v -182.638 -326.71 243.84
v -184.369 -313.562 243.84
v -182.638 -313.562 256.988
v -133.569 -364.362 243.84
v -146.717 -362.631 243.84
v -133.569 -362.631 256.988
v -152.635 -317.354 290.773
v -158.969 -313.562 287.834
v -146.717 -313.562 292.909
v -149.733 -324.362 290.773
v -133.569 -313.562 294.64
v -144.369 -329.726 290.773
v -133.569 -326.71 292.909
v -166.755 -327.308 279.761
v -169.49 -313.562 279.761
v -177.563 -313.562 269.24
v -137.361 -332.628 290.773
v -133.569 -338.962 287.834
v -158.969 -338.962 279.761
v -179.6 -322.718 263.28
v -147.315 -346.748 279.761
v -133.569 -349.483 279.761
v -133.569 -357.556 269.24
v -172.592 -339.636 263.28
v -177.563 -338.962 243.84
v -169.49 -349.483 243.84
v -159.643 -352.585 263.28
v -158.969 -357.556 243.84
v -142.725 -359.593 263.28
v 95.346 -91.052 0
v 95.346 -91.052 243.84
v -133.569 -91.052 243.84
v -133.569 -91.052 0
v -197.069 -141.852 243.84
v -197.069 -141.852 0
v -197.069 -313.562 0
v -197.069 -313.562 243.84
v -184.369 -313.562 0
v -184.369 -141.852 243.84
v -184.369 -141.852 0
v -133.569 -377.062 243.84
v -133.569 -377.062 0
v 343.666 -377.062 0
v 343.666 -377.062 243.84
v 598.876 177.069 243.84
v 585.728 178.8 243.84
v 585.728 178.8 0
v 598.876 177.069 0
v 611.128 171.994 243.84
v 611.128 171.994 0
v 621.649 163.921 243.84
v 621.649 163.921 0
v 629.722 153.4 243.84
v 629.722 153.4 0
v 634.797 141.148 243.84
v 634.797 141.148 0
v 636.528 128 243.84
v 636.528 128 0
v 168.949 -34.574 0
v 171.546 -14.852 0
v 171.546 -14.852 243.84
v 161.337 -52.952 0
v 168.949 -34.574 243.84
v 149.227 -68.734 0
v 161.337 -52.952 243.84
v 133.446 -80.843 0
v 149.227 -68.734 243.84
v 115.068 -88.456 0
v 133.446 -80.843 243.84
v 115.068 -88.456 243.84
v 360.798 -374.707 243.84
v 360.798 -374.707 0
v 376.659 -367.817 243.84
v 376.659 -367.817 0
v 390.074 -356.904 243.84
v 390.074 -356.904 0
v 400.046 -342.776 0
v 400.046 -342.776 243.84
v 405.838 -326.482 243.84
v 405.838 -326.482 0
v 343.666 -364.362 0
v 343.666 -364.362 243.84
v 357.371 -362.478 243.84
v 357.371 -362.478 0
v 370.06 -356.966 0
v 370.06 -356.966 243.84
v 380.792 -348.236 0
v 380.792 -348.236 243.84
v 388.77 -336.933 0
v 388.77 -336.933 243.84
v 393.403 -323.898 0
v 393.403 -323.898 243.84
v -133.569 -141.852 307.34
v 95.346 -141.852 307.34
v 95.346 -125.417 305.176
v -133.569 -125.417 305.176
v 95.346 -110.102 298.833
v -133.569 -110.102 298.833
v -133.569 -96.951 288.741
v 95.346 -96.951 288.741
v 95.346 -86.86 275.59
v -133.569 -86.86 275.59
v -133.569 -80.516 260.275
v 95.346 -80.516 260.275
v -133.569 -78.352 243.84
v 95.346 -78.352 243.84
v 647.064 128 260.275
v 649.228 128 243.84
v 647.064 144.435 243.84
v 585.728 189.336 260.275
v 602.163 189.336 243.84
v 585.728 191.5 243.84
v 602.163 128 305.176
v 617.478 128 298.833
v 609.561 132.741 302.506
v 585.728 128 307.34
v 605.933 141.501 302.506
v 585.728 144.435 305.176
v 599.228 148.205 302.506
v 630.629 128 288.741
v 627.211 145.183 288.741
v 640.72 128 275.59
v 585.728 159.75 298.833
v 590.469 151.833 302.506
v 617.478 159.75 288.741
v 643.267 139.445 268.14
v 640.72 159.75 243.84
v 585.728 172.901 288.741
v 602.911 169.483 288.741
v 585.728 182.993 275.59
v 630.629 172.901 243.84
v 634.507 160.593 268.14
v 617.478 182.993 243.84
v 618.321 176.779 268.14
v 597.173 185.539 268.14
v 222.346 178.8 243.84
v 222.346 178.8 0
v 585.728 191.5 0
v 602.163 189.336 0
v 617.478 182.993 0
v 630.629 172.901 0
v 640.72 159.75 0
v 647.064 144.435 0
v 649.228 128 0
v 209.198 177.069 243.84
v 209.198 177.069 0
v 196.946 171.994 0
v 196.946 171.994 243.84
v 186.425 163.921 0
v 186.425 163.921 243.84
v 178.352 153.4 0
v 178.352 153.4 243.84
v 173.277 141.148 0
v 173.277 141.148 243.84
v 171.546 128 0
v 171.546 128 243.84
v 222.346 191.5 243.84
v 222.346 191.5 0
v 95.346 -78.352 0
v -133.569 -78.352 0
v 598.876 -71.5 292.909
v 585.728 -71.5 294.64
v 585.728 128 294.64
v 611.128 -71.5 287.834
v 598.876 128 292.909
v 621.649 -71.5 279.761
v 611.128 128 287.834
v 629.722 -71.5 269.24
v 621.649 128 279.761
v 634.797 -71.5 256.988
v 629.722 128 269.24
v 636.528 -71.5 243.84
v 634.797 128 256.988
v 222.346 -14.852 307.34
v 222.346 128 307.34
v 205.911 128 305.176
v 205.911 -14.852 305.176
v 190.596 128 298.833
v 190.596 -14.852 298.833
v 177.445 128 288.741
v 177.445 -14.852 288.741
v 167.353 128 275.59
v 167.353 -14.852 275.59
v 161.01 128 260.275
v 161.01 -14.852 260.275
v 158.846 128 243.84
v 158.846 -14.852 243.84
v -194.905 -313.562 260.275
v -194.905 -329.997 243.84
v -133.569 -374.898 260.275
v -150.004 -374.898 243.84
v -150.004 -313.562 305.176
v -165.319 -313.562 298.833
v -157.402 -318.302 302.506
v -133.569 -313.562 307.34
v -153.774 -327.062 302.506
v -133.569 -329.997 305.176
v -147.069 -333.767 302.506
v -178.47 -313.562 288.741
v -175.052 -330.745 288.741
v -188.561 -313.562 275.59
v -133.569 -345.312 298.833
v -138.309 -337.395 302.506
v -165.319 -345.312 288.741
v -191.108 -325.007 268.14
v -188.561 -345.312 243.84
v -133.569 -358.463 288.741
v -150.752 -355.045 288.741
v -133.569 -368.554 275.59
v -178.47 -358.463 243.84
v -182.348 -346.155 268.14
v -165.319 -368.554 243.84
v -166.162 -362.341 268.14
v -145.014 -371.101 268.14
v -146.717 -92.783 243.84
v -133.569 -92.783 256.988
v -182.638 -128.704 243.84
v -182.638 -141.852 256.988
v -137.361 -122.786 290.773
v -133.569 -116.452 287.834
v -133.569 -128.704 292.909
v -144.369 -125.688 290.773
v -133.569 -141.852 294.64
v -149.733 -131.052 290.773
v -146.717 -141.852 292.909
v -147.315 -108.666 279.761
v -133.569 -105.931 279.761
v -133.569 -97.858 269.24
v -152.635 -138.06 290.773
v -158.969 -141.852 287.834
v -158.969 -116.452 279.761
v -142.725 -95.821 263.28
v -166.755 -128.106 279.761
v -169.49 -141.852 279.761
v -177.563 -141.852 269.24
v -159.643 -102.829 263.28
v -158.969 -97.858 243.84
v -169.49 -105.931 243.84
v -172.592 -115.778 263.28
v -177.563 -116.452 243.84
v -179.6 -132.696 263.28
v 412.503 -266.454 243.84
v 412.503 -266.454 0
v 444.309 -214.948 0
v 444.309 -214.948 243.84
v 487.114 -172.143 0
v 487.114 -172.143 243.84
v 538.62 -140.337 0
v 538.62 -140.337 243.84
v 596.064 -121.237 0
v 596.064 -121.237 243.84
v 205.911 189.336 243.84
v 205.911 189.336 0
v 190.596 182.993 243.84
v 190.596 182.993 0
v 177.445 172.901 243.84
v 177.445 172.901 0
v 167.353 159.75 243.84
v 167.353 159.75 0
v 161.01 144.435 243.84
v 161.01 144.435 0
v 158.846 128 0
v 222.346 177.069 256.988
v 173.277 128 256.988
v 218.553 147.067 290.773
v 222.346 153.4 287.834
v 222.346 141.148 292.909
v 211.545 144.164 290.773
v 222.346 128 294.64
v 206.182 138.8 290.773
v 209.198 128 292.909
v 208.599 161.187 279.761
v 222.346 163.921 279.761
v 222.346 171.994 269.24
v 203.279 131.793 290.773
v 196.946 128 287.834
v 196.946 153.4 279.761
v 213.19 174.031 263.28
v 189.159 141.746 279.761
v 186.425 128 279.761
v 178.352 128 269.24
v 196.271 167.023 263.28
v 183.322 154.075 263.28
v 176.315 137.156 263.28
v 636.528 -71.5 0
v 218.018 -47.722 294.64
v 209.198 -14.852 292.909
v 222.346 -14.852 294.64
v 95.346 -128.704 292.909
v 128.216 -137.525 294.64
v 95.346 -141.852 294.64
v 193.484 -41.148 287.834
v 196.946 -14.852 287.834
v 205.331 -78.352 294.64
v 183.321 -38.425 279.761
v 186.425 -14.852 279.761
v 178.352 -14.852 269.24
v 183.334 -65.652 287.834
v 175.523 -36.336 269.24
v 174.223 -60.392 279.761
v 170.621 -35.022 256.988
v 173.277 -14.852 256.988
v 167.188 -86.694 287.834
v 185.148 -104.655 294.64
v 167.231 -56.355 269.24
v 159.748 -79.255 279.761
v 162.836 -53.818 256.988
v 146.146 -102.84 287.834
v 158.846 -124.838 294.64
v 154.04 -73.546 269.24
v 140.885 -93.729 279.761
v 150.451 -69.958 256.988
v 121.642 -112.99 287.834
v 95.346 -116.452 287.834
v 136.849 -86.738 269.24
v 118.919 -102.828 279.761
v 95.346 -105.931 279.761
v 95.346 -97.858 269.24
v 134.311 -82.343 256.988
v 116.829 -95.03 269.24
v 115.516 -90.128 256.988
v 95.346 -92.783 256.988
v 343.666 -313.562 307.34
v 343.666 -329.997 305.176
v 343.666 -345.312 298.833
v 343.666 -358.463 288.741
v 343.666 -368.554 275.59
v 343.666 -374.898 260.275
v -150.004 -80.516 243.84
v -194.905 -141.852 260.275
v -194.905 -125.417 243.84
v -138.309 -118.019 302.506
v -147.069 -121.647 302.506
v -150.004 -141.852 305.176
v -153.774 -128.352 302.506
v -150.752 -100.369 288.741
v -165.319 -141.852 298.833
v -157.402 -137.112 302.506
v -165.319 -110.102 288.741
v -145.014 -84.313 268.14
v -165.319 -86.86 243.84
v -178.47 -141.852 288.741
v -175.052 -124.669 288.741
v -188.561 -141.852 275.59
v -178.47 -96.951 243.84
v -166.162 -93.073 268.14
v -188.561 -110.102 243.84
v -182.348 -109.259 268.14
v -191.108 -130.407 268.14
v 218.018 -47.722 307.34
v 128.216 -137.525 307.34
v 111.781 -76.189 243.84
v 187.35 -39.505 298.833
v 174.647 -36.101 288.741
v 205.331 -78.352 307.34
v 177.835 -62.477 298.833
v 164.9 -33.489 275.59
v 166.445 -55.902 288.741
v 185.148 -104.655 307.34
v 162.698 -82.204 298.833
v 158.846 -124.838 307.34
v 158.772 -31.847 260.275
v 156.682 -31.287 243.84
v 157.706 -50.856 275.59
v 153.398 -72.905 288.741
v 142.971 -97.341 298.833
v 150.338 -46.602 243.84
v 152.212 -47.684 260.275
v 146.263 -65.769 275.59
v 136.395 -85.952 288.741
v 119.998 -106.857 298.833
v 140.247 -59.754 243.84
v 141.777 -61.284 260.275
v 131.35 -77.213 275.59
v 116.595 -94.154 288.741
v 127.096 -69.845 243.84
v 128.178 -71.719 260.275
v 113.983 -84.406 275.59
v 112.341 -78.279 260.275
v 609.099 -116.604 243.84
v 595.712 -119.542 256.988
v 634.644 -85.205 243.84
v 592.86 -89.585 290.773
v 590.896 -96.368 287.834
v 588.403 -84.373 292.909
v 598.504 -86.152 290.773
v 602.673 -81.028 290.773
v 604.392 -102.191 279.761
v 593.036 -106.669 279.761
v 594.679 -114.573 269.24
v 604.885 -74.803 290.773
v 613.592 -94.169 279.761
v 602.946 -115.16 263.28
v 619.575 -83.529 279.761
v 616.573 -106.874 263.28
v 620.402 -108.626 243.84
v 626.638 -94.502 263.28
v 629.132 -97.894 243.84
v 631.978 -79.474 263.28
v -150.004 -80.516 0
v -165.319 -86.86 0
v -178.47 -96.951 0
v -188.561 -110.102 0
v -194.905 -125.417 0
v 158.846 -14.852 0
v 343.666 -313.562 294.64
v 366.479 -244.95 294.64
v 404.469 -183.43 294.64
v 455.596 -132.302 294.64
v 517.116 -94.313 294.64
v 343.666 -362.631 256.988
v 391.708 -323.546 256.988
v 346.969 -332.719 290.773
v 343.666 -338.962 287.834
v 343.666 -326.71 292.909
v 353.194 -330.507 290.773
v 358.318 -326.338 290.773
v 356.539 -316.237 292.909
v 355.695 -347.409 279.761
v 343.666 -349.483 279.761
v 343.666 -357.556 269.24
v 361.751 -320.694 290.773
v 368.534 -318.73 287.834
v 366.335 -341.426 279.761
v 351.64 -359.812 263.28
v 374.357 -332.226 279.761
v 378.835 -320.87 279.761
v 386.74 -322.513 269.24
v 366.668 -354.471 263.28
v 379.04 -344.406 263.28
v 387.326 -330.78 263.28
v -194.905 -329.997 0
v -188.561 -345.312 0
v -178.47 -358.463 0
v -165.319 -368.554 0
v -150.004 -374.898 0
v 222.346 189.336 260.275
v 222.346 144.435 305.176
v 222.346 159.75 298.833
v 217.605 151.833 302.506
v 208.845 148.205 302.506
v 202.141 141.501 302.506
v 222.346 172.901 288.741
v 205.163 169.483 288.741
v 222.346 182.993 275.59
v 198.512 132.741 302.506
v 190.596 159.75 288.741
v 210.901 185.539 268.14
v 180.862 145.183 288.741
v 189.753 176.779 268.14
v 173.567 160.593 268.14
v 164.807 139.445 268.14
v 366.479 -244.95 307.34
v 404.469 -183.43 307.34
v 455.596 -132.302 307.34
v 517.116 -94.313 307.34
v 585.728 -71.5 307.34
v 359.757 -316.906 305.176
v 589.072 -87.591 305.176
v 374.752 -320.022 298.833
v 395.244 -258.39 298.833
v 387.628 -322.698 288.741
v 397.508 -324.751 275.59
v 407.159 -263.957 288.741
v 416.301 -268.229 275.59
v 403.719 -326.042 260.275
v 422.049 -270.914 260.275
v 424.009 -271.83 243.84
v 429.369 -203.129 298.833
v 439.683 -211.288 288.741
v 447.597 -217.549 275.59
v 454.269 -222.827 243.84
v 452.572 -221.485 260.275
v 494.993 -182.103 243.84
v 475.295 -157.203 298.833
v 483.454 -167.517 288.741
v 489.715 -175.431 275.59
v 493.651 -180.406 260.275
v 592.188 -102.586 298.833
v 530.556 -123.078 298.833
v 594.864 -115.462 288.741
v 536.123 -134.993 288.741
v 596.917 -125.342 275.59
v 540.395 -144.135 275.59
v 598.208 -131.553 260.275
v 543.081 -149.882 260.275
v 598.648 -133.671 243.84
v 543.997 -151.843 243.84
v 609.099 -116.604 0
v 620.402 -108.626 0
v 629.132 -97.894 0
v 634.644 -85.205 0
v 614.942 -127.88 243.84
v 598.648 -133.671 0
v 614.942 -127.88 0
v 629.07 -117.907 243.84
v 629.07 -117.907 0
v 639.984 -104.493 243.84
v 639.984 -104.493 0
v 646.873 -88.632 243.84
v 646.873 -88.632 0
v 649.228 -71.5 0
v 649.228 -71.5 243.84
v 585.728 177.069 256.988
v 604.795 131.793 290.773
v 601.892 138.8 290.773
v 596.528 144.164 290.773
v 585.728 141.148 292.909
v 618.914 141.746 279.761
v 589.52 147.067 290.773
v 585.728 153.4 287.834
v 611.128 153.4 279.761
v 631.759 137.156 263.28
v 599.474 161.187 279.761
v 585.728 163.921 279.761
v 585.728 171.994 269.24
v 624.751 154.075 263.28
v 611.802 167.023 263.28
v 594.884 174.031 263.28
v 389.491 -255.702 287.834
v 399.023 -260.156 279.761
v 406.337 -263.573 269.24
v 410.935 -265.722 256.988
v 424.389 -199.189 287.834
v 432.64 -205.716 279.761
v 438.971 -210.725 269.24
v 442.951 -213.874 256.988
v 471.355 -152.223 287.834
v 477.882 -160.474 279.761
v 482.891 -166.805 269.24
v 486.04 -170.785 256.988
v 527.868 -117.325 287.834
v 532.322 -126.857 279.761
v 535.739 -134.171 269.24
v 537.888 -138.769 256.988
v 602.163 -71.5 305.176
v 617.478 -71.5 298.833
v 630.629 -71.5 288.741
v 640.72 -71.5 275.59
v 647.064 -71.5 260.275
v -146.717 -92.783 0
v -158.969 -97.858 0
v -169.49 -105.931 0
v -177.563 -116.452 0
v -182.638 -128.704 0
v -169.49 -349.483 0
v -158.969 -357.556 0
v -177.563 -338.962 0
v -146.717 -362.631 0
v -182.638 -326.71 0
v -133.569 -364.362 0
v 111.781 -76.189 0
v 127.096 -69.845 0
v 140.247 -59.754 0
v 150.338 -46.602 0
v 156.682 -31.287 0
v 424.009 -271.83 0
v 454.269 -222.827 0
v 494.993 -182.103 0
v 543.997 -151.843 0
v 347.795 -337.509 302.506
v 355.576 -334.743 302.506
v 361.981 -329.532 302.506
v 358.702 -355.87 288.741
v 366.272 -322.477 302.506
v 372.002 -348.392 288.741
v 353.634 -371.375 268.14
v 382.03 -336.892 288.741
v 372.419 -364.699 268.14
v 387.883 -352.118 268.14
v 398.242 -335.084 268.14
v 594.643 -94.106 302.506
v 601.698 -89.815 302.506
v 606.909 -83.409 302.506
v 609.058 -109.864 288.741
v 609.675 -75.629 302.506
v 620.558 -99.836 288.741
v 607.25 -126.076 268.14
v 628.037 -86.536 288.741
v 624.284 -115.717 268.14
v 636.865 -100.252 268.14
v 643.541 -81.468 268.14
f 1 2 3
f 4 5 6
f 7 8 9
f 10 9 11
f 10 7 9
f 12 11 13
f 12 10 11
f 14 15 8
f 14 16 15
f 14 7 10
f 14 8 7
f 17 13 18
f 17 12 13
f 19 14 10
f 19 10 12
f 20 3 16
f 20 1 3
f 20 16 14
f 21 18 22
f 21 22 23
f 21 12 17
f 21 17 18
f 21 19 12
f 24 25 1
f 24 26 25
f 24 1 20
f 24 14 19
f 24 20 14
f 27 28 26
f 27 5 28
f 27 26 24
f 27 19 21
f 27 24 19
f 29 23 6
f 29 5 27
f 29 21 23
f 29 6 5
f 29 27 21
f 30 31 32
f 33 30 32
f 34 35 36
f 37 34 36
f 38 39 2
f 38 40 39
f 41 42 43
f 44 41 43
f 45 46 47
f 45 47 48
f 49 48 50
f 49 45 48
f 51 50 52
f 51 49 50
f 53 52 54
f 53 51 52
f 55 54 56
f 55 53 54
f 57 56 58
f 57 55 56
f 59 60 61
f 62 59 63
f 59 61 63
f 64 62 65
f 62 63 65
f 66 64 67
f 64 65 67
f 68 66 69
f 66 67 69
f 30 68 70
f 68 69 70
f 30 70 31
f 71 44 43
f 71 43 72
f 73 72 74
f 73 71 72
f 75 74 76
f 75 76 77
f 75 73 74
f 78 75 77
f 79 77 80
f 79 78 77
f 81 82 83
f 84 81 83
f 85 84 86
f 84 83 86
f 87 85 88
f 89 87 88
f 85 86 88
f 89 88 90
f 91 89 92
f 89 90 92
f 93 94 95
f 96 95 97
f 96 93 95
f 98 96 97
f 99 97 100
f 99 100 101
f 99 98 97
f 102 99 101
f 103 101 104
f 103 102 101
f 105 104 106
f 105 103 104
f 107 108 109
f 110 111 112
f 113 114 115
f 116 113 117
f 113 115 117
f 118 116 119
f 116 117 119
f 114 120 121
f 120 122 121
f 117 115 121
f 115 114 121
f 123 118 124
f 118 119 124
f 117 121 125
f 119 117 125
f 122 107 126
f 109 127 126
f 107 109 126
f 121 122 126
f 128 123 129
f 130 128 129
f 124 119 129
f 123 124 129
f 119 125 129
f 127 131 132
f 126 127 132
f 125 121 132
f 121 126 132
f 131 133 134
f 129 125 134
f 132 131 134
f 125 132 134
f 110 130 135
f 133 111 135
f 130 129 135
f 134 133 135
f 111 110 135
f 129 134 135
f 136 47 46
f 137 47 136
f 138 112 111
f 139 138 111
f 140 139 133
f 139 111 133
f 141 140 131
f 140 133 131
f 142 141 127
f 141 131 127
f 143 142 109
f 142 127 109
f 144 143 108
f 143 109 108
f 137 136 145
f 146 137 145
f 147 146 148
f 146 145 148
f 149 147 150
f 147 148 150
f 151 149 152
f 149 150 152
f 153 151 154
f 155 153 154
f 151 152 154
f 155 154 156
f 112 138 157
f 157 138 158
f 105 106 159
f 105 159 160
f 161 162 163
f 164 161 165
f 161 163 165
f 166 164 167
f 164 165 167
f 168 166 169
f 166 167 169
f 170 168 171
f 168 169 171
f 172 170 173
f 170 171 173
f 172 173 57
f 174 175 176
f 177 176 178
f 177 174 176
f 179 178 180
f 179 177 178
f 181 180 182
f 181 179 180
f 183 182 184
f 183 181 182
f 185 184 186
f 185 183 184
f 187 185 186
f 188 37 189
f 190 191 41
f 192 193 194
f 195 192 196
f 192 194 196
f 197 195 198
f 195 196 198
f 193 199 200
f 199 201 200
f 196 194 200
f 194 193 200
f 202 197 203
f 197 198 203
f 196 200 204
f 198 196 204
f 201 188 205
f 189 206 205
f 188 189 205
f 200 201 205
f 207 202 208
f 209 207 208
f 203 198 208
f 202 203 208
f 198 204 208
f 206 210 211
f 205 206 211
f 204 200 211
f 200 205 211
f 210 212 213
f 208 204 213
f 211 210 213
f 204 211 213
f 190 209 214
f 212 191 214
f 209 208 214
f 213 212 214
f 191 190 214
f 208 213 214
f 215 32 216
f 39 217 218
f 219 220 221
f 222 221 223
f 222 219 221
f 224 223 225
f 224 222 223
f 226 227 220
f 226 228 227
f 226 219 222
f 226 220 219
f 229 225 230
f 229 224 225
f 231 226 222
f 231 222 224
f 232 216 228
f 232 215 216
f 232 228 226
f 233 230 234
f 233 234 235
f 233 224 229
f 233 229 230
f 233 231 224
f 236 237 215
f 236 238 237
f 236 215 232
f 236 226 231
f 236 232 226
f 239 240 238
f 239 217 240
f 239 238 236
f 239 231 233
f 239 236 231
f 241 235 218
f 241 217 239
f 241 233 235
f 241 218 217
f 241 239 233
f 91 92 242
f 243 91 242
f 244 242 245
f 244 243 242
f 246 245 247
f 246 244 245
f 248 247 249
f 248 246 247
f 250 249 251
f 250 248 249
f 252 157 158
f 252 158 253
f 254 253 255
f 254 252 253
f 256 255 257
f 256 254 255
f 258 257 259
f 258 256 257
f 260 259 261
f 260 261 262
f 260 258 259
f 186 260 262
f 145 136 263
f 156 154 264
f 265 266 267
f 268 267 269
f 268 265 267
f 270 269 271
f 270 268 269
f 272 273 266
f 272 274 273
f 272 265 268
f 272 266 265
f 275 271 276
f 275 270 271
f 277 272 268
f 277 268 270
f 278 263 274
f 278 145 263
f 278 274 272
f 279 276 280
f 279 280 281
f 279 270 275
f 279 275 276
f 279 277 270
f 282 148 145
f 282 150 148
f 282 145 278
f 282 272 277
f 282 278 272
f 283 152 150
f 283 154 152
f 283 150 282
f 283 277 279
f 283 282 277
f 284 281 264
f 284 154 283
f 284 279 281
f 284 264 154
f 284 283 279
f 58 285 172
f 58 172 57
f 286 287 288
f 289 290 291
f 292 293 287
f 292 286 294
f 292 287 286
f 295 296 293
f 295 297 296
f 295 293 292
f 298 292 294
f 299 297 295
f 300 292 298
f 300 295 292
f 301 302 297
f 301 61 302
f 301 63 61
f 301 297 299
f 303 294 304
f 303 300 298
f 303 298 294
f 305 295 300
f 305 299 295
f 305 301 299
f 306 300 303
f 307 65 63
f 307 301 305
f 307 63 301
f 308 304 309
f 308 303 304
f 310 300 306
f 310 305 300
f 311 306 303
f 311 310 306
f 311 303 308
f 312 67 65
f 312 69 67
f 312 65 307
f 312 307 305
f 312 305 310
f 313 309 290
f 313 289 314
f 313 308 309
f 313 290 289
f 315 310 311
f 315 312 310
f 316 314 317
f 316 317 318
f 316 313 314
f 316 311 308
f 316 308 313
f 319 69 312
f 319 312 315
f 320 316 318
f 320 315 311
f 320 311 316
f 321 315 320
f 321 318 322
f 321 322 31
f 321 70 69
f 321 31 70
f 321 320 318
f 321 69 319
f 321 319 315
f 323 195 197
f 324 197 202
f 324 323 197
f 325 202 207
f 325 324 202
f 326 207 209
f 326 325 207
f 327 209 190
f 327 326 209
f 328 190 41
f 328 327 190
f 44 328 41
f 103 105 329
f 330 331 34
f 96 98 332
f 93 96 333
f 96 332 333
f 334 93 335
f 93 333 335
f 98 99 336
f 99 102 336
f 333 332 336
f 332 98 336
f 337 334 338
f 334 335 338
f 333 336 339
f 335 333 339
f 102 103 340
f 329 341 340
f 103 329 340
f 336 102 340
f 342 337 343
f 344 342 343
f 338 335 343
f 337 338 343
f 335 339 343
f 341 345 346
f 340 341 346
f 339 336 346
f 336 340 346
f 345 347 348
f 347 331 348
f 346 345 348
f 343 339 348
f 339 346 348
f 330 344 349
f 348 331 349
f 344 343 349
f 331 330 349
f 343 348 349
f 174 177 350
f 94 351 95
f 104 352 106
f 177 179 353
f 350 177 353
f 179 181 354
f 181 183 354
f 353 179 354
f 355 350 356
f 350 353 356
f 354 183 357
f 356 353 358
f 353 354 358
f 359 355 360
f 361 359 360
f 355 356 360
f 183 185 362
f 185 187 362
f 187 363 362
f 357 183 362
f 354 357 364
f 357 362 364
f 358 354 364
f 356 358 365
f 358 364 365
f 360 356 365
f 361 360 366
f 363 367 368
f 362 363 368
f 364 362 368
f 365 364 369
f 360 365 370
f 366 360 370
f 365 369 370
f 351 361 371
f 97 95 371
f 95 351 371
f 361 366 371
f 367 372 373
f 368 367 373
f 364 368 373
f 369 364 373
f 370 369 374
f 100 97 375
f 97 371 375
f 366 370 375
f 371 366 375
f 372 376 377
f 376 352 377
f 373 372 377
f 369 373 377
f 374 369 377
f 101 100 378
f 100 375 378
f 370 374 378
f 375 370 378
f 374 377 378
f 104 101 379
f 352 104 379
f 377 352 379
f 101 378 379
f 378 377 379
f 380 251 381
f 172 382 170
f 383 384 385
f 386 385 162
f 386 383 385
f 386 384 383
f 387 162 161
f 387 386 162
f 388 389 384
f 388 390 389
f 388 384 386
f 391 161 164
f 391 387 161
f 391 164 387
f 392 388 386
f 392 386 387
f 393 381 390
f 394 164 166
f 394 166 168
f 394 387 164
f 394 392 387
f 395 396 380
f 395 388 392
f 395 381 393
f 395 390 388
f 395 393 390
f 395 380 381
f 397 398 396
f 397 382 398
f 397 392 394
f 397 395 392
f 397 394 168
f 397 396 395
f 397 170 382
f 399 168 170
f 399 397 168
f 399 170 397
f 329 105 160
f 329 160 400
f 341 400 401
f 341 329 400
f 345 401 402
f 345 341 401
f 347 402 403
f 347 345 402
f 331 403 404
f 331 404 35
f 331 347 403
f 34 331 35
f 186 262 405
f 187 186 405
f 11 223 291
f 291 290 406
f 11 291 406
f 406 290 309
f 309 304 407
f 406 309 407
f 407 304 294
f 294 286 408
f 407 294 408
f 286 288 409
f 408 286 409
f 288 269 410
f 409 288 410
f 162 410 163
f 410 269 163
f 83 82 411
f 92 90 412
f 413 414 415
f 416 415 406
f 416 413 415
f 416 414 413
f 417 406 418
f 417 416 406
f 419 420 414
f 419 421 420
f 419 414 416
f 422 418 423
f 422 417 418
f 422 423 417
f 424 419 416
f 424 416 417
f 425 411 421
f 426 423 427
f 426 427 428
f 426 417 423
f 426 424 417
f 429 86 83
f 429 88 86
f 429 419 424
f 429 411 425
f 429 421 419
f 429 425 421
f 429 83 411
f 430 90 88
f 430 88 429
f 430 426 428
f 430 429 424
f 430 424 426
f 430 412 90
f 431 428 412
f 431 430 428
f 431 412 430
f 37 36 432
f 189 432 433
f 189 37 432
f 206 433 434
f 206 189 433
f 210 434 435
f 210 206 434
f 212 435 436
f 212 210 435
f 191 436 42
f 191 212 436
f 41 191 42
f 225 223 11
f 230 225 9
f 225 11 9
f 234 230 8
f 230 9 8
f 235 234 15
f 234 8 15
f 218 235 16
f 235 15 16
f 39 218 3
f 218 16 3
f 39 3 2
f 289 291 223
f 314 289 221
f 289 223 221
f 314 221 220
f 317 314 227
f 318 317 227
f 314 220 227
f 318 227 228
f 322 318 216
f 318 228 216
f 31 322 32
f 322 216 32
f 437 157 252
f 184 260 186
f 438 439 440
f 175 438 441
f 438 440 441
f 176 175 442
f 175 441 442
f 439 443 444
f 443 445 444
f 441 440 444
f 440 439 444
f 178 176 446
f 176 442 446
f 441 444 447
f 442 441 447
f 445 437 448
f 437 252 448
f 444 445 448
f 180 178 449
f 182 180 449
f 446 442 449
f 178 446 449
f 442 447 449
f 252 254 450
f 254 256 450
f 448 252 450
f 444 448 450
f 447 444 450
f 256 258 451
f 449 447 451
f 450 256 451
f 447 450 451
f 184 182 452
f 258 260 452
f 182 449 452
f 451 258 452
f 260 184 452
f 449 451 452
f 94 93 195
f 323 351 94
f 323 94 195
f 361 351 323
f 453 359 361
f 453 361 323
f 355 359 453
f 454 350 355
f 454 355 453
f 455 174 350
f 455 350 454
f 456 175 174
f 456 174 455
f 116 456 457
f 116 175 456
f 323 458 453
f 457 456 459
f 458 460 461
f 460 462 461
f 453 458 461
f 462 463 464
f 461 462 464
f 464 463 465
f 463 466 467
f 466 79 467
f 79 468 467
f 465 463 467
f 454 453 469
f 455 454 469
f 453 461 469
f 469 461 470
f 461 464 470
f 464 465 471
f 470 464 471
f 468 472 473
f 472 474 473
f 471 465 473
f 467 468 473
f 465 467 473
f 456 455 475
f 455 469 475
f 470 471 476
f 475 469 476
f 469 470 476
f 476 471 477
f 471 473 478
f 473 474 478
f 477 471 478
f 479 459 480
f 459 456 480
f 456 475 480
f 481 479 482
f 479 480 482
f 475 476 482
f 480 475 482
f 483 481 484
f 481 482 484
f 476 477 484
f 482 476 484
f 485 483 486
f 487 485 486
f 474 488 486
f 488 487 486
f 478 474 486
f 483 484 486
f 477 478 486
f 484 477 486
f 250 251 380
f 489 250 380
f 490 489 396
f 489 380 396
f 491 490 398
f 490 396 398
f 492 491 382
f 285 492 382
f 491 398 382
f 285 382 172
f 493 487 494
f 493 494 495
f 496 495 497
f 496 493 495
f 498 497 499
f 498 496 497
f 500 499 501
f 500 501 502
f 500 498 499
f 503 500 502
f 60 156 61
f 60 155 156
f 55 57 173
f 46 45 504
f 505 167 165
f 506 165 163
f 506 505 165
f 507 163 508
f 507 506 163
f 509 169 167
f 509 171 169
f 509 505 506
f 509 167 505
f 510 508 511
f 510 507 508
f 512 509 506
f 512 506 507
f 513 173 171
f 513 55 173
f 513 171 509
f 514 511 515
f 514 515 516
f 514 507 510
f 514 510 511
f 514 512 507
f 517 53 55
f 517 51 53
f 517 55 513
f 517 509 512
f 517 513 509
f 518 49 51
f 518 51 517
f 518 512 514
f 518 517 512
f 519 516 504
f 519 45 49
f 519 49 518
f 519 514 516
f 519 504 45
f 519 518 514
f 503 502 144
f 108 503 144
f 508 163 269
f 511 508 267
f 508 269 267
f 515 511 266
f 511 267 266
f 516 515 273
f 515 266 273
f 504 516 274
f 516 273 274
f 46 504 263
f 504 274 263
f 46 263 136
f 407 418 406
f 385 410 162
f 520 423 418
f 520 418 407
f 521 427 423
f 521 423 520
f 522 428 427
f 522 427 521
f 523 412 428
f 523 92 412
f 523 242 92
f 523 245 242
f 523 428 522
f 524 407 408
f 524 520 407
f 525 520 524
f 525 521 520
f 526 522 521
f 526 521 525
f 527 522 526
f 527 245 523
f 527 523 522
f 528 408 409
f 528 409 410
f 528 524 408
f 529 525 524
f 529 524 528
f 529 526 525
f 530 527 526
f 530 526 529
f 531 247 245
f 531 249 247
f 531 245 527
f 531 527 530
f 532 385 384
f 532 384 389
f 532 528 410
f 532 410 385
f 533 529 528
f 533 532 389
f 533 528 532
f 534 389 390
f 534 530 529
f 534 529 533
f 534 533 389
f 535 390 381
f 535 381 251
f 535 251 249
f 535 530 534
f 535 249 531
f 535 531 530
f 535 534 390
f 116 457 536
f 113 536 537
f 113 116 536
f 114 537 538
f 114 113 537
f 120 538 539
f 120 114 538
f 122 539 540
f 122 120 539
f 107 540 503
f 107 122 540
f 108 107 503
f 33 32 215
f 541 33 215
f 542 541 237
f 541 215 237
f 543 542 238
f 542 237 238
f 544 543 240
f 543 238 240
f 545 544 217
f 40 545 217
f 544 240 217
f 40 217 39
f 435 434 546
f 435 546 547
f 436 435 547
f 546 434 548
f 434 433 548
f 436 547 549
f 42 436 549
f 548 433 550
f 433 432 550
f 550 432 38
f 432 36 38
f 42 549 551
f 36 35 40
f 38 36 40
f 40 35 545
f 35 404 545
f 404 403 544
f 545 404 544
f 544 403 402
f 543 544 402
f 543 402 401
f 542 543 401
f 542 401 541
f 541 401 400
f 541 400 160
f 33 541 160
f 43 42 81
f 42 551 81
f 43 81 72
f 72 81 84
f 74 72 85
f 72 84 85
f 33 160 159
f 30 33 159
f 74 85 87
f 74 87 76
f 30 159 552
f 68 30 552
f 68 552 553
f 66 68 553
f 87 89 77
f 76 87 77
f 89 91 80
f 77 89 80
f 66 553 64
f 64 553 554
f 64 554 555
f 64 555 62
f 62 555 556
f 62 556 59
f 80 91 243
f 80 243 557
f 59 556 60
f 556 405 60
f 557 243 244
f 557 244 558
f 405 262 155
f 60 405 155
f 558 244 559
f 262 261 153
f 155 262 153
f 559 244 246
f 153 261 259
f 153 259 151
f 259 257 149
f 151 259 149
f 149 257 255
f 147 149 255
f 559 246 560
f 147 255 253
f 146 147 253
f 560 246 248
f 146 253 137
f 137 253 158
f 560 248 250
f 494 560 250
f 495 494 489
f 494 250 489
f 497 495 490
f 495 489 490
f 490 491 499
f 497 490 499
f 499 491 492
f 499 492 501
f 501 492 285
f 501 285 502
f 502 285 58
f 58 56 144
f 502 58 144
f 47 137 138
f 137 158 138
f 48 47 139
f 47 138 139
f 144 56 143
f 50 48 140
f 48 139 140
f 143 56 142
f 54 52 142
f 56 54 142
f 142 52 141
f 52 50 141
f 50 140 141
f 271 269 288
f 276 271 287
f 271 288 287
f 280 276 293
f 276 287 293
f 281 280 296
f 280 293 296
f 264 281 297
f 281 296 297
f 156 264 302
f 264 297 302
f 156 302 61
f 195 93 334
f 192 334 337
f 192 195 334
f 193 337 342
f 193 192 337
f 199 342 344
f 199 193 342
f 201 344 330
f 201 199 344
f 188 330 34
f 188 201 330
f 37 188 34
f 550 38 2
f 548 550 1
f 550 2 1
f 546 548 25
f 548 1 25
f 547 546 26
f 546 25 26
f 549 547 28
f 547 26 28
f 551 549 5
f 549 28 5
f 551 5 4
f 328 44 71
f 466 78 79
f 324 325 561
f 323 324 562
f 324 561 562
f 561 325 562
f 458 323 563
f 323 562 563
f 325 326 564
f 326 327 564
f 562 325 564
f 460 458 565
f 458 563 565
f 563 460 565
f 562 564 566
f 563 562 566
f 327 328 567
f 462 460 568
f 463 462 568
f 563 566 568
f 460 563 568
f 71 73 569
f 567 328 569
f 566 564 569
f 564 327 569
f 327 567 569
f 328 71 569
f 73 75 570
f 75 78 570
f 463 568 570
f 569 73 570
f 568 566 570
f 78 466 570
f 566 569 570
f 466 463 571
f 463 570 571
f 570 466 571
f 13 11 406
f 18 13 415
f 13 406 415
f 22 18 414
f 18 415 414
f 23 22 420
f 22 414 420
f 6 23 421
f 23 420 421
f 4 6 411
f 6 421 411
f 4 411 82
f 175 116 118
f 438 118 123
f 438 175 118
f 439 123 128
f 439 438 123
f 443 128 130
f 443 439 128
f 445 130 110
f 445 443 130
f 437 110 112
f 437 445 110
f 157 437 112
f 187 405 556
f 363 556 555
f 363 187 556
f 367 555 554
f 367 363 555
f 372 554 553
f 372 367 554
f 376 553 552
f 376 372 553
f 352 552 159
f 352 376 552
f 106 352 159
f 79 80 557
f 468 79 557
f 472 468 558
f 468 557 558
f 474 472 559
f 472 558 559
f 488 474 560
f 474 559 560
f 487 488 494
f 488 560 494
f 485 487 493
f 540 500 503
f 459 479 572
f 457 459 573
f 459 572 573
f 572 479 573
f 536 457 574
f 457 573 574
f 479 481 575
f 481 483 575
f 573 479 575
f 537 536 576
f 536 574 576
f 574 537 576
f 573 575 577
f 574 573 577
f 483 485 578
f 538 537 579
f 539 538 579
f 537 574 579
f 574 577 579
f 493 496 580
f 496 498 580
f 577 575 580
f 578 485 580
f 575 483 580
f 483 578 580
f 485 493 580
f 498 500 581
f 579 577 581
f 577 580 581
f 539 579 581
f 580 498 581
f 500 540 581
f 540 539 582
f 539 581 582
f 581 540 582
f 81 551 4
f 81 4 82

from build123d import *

# Parameters (mm, degrees)
F1_DEPTH = 307.34
F2_R     = 63.5
F3_R     = 63.5
F4_T     = -12.7


with BuildPart() as f1:
    # F0 (on Top) → F1 (new body)
    with BuildSketch(Plane.XY):
        with BuildLine():
            Line((649.227738, 191.499934), (158.845842, 191.499934))
            Line((158.845842, 191.499934), (158.845842, -78.352302))
            Line((158.845842, -78.352302), (-197.068691, -78.352302))
            Line((-197.068691, -78.352302), (-197.068691, -377.061605))
            Line((-197.068691, -377.061605), (400.637456, -377.061605))
            ThreePointArc((400.637456, -377.061605), (473.447864, -201.281731), (649.227738, -128.471323))
            Line((649.227738, -128.471323), (649.227738, 191.499934))
        make_face()
    extrude(amount=F1_DEPTH)

    # F2
    f2_edges = [f1.edges().sort_by_distance(p)[0] for p in [
        (158.845842, 191.499934, 153.67),
        (158.845842, -78.352302, 153.67),
        (-197.068691, -78.352302, 153.67),
        (-197.068691, -377.061605, 153.67),
        (649.227738, -128.471323, 153.67),
        (400.637456, -377.061605, 153.67),
        (649.227738, 191.499934, 153.67),
    ]]
    fillet(f2_edges, radius=F2_R)

    # F3
    f3_edges = [f1.edges().sort_by_distance(p)[0] for p in [
        (473.447864, -201.281731, 307.34),
        (383.739621, -362.819492, 307.34),
        (634.985625, -111.573488, 307.34),
        (105.048558, -377.061605, 307.34),
        (649.227738, 28.25013, 307.34),
        (-178.469972, -358.462886, 307.34),
        (630.629019, 172.901214, 307.34),
        (-197.068691, -227.706954, 307.34),
        (404.03679, 191.499934, 307.34),
        (-178.469972, -96.951022, 307.34),
        (177.444561, 172.901214, 307.34),
        (-19.111425, -78.352302, 307.34),
        (158.845842, 56.573816, 307.34),
        (140.247122, -59.753583, 307.34),
    ]]
    fillet(f3_edges, radius=F3_R)

    # F4
    f4_openings = [f1.faces().sort_by_distance(p)[0] for p in [
        (250.443823, -109.892421, 0),
    ]]
    offset(amount=F4_T, openings=f4_openings)


solid = f1.part
